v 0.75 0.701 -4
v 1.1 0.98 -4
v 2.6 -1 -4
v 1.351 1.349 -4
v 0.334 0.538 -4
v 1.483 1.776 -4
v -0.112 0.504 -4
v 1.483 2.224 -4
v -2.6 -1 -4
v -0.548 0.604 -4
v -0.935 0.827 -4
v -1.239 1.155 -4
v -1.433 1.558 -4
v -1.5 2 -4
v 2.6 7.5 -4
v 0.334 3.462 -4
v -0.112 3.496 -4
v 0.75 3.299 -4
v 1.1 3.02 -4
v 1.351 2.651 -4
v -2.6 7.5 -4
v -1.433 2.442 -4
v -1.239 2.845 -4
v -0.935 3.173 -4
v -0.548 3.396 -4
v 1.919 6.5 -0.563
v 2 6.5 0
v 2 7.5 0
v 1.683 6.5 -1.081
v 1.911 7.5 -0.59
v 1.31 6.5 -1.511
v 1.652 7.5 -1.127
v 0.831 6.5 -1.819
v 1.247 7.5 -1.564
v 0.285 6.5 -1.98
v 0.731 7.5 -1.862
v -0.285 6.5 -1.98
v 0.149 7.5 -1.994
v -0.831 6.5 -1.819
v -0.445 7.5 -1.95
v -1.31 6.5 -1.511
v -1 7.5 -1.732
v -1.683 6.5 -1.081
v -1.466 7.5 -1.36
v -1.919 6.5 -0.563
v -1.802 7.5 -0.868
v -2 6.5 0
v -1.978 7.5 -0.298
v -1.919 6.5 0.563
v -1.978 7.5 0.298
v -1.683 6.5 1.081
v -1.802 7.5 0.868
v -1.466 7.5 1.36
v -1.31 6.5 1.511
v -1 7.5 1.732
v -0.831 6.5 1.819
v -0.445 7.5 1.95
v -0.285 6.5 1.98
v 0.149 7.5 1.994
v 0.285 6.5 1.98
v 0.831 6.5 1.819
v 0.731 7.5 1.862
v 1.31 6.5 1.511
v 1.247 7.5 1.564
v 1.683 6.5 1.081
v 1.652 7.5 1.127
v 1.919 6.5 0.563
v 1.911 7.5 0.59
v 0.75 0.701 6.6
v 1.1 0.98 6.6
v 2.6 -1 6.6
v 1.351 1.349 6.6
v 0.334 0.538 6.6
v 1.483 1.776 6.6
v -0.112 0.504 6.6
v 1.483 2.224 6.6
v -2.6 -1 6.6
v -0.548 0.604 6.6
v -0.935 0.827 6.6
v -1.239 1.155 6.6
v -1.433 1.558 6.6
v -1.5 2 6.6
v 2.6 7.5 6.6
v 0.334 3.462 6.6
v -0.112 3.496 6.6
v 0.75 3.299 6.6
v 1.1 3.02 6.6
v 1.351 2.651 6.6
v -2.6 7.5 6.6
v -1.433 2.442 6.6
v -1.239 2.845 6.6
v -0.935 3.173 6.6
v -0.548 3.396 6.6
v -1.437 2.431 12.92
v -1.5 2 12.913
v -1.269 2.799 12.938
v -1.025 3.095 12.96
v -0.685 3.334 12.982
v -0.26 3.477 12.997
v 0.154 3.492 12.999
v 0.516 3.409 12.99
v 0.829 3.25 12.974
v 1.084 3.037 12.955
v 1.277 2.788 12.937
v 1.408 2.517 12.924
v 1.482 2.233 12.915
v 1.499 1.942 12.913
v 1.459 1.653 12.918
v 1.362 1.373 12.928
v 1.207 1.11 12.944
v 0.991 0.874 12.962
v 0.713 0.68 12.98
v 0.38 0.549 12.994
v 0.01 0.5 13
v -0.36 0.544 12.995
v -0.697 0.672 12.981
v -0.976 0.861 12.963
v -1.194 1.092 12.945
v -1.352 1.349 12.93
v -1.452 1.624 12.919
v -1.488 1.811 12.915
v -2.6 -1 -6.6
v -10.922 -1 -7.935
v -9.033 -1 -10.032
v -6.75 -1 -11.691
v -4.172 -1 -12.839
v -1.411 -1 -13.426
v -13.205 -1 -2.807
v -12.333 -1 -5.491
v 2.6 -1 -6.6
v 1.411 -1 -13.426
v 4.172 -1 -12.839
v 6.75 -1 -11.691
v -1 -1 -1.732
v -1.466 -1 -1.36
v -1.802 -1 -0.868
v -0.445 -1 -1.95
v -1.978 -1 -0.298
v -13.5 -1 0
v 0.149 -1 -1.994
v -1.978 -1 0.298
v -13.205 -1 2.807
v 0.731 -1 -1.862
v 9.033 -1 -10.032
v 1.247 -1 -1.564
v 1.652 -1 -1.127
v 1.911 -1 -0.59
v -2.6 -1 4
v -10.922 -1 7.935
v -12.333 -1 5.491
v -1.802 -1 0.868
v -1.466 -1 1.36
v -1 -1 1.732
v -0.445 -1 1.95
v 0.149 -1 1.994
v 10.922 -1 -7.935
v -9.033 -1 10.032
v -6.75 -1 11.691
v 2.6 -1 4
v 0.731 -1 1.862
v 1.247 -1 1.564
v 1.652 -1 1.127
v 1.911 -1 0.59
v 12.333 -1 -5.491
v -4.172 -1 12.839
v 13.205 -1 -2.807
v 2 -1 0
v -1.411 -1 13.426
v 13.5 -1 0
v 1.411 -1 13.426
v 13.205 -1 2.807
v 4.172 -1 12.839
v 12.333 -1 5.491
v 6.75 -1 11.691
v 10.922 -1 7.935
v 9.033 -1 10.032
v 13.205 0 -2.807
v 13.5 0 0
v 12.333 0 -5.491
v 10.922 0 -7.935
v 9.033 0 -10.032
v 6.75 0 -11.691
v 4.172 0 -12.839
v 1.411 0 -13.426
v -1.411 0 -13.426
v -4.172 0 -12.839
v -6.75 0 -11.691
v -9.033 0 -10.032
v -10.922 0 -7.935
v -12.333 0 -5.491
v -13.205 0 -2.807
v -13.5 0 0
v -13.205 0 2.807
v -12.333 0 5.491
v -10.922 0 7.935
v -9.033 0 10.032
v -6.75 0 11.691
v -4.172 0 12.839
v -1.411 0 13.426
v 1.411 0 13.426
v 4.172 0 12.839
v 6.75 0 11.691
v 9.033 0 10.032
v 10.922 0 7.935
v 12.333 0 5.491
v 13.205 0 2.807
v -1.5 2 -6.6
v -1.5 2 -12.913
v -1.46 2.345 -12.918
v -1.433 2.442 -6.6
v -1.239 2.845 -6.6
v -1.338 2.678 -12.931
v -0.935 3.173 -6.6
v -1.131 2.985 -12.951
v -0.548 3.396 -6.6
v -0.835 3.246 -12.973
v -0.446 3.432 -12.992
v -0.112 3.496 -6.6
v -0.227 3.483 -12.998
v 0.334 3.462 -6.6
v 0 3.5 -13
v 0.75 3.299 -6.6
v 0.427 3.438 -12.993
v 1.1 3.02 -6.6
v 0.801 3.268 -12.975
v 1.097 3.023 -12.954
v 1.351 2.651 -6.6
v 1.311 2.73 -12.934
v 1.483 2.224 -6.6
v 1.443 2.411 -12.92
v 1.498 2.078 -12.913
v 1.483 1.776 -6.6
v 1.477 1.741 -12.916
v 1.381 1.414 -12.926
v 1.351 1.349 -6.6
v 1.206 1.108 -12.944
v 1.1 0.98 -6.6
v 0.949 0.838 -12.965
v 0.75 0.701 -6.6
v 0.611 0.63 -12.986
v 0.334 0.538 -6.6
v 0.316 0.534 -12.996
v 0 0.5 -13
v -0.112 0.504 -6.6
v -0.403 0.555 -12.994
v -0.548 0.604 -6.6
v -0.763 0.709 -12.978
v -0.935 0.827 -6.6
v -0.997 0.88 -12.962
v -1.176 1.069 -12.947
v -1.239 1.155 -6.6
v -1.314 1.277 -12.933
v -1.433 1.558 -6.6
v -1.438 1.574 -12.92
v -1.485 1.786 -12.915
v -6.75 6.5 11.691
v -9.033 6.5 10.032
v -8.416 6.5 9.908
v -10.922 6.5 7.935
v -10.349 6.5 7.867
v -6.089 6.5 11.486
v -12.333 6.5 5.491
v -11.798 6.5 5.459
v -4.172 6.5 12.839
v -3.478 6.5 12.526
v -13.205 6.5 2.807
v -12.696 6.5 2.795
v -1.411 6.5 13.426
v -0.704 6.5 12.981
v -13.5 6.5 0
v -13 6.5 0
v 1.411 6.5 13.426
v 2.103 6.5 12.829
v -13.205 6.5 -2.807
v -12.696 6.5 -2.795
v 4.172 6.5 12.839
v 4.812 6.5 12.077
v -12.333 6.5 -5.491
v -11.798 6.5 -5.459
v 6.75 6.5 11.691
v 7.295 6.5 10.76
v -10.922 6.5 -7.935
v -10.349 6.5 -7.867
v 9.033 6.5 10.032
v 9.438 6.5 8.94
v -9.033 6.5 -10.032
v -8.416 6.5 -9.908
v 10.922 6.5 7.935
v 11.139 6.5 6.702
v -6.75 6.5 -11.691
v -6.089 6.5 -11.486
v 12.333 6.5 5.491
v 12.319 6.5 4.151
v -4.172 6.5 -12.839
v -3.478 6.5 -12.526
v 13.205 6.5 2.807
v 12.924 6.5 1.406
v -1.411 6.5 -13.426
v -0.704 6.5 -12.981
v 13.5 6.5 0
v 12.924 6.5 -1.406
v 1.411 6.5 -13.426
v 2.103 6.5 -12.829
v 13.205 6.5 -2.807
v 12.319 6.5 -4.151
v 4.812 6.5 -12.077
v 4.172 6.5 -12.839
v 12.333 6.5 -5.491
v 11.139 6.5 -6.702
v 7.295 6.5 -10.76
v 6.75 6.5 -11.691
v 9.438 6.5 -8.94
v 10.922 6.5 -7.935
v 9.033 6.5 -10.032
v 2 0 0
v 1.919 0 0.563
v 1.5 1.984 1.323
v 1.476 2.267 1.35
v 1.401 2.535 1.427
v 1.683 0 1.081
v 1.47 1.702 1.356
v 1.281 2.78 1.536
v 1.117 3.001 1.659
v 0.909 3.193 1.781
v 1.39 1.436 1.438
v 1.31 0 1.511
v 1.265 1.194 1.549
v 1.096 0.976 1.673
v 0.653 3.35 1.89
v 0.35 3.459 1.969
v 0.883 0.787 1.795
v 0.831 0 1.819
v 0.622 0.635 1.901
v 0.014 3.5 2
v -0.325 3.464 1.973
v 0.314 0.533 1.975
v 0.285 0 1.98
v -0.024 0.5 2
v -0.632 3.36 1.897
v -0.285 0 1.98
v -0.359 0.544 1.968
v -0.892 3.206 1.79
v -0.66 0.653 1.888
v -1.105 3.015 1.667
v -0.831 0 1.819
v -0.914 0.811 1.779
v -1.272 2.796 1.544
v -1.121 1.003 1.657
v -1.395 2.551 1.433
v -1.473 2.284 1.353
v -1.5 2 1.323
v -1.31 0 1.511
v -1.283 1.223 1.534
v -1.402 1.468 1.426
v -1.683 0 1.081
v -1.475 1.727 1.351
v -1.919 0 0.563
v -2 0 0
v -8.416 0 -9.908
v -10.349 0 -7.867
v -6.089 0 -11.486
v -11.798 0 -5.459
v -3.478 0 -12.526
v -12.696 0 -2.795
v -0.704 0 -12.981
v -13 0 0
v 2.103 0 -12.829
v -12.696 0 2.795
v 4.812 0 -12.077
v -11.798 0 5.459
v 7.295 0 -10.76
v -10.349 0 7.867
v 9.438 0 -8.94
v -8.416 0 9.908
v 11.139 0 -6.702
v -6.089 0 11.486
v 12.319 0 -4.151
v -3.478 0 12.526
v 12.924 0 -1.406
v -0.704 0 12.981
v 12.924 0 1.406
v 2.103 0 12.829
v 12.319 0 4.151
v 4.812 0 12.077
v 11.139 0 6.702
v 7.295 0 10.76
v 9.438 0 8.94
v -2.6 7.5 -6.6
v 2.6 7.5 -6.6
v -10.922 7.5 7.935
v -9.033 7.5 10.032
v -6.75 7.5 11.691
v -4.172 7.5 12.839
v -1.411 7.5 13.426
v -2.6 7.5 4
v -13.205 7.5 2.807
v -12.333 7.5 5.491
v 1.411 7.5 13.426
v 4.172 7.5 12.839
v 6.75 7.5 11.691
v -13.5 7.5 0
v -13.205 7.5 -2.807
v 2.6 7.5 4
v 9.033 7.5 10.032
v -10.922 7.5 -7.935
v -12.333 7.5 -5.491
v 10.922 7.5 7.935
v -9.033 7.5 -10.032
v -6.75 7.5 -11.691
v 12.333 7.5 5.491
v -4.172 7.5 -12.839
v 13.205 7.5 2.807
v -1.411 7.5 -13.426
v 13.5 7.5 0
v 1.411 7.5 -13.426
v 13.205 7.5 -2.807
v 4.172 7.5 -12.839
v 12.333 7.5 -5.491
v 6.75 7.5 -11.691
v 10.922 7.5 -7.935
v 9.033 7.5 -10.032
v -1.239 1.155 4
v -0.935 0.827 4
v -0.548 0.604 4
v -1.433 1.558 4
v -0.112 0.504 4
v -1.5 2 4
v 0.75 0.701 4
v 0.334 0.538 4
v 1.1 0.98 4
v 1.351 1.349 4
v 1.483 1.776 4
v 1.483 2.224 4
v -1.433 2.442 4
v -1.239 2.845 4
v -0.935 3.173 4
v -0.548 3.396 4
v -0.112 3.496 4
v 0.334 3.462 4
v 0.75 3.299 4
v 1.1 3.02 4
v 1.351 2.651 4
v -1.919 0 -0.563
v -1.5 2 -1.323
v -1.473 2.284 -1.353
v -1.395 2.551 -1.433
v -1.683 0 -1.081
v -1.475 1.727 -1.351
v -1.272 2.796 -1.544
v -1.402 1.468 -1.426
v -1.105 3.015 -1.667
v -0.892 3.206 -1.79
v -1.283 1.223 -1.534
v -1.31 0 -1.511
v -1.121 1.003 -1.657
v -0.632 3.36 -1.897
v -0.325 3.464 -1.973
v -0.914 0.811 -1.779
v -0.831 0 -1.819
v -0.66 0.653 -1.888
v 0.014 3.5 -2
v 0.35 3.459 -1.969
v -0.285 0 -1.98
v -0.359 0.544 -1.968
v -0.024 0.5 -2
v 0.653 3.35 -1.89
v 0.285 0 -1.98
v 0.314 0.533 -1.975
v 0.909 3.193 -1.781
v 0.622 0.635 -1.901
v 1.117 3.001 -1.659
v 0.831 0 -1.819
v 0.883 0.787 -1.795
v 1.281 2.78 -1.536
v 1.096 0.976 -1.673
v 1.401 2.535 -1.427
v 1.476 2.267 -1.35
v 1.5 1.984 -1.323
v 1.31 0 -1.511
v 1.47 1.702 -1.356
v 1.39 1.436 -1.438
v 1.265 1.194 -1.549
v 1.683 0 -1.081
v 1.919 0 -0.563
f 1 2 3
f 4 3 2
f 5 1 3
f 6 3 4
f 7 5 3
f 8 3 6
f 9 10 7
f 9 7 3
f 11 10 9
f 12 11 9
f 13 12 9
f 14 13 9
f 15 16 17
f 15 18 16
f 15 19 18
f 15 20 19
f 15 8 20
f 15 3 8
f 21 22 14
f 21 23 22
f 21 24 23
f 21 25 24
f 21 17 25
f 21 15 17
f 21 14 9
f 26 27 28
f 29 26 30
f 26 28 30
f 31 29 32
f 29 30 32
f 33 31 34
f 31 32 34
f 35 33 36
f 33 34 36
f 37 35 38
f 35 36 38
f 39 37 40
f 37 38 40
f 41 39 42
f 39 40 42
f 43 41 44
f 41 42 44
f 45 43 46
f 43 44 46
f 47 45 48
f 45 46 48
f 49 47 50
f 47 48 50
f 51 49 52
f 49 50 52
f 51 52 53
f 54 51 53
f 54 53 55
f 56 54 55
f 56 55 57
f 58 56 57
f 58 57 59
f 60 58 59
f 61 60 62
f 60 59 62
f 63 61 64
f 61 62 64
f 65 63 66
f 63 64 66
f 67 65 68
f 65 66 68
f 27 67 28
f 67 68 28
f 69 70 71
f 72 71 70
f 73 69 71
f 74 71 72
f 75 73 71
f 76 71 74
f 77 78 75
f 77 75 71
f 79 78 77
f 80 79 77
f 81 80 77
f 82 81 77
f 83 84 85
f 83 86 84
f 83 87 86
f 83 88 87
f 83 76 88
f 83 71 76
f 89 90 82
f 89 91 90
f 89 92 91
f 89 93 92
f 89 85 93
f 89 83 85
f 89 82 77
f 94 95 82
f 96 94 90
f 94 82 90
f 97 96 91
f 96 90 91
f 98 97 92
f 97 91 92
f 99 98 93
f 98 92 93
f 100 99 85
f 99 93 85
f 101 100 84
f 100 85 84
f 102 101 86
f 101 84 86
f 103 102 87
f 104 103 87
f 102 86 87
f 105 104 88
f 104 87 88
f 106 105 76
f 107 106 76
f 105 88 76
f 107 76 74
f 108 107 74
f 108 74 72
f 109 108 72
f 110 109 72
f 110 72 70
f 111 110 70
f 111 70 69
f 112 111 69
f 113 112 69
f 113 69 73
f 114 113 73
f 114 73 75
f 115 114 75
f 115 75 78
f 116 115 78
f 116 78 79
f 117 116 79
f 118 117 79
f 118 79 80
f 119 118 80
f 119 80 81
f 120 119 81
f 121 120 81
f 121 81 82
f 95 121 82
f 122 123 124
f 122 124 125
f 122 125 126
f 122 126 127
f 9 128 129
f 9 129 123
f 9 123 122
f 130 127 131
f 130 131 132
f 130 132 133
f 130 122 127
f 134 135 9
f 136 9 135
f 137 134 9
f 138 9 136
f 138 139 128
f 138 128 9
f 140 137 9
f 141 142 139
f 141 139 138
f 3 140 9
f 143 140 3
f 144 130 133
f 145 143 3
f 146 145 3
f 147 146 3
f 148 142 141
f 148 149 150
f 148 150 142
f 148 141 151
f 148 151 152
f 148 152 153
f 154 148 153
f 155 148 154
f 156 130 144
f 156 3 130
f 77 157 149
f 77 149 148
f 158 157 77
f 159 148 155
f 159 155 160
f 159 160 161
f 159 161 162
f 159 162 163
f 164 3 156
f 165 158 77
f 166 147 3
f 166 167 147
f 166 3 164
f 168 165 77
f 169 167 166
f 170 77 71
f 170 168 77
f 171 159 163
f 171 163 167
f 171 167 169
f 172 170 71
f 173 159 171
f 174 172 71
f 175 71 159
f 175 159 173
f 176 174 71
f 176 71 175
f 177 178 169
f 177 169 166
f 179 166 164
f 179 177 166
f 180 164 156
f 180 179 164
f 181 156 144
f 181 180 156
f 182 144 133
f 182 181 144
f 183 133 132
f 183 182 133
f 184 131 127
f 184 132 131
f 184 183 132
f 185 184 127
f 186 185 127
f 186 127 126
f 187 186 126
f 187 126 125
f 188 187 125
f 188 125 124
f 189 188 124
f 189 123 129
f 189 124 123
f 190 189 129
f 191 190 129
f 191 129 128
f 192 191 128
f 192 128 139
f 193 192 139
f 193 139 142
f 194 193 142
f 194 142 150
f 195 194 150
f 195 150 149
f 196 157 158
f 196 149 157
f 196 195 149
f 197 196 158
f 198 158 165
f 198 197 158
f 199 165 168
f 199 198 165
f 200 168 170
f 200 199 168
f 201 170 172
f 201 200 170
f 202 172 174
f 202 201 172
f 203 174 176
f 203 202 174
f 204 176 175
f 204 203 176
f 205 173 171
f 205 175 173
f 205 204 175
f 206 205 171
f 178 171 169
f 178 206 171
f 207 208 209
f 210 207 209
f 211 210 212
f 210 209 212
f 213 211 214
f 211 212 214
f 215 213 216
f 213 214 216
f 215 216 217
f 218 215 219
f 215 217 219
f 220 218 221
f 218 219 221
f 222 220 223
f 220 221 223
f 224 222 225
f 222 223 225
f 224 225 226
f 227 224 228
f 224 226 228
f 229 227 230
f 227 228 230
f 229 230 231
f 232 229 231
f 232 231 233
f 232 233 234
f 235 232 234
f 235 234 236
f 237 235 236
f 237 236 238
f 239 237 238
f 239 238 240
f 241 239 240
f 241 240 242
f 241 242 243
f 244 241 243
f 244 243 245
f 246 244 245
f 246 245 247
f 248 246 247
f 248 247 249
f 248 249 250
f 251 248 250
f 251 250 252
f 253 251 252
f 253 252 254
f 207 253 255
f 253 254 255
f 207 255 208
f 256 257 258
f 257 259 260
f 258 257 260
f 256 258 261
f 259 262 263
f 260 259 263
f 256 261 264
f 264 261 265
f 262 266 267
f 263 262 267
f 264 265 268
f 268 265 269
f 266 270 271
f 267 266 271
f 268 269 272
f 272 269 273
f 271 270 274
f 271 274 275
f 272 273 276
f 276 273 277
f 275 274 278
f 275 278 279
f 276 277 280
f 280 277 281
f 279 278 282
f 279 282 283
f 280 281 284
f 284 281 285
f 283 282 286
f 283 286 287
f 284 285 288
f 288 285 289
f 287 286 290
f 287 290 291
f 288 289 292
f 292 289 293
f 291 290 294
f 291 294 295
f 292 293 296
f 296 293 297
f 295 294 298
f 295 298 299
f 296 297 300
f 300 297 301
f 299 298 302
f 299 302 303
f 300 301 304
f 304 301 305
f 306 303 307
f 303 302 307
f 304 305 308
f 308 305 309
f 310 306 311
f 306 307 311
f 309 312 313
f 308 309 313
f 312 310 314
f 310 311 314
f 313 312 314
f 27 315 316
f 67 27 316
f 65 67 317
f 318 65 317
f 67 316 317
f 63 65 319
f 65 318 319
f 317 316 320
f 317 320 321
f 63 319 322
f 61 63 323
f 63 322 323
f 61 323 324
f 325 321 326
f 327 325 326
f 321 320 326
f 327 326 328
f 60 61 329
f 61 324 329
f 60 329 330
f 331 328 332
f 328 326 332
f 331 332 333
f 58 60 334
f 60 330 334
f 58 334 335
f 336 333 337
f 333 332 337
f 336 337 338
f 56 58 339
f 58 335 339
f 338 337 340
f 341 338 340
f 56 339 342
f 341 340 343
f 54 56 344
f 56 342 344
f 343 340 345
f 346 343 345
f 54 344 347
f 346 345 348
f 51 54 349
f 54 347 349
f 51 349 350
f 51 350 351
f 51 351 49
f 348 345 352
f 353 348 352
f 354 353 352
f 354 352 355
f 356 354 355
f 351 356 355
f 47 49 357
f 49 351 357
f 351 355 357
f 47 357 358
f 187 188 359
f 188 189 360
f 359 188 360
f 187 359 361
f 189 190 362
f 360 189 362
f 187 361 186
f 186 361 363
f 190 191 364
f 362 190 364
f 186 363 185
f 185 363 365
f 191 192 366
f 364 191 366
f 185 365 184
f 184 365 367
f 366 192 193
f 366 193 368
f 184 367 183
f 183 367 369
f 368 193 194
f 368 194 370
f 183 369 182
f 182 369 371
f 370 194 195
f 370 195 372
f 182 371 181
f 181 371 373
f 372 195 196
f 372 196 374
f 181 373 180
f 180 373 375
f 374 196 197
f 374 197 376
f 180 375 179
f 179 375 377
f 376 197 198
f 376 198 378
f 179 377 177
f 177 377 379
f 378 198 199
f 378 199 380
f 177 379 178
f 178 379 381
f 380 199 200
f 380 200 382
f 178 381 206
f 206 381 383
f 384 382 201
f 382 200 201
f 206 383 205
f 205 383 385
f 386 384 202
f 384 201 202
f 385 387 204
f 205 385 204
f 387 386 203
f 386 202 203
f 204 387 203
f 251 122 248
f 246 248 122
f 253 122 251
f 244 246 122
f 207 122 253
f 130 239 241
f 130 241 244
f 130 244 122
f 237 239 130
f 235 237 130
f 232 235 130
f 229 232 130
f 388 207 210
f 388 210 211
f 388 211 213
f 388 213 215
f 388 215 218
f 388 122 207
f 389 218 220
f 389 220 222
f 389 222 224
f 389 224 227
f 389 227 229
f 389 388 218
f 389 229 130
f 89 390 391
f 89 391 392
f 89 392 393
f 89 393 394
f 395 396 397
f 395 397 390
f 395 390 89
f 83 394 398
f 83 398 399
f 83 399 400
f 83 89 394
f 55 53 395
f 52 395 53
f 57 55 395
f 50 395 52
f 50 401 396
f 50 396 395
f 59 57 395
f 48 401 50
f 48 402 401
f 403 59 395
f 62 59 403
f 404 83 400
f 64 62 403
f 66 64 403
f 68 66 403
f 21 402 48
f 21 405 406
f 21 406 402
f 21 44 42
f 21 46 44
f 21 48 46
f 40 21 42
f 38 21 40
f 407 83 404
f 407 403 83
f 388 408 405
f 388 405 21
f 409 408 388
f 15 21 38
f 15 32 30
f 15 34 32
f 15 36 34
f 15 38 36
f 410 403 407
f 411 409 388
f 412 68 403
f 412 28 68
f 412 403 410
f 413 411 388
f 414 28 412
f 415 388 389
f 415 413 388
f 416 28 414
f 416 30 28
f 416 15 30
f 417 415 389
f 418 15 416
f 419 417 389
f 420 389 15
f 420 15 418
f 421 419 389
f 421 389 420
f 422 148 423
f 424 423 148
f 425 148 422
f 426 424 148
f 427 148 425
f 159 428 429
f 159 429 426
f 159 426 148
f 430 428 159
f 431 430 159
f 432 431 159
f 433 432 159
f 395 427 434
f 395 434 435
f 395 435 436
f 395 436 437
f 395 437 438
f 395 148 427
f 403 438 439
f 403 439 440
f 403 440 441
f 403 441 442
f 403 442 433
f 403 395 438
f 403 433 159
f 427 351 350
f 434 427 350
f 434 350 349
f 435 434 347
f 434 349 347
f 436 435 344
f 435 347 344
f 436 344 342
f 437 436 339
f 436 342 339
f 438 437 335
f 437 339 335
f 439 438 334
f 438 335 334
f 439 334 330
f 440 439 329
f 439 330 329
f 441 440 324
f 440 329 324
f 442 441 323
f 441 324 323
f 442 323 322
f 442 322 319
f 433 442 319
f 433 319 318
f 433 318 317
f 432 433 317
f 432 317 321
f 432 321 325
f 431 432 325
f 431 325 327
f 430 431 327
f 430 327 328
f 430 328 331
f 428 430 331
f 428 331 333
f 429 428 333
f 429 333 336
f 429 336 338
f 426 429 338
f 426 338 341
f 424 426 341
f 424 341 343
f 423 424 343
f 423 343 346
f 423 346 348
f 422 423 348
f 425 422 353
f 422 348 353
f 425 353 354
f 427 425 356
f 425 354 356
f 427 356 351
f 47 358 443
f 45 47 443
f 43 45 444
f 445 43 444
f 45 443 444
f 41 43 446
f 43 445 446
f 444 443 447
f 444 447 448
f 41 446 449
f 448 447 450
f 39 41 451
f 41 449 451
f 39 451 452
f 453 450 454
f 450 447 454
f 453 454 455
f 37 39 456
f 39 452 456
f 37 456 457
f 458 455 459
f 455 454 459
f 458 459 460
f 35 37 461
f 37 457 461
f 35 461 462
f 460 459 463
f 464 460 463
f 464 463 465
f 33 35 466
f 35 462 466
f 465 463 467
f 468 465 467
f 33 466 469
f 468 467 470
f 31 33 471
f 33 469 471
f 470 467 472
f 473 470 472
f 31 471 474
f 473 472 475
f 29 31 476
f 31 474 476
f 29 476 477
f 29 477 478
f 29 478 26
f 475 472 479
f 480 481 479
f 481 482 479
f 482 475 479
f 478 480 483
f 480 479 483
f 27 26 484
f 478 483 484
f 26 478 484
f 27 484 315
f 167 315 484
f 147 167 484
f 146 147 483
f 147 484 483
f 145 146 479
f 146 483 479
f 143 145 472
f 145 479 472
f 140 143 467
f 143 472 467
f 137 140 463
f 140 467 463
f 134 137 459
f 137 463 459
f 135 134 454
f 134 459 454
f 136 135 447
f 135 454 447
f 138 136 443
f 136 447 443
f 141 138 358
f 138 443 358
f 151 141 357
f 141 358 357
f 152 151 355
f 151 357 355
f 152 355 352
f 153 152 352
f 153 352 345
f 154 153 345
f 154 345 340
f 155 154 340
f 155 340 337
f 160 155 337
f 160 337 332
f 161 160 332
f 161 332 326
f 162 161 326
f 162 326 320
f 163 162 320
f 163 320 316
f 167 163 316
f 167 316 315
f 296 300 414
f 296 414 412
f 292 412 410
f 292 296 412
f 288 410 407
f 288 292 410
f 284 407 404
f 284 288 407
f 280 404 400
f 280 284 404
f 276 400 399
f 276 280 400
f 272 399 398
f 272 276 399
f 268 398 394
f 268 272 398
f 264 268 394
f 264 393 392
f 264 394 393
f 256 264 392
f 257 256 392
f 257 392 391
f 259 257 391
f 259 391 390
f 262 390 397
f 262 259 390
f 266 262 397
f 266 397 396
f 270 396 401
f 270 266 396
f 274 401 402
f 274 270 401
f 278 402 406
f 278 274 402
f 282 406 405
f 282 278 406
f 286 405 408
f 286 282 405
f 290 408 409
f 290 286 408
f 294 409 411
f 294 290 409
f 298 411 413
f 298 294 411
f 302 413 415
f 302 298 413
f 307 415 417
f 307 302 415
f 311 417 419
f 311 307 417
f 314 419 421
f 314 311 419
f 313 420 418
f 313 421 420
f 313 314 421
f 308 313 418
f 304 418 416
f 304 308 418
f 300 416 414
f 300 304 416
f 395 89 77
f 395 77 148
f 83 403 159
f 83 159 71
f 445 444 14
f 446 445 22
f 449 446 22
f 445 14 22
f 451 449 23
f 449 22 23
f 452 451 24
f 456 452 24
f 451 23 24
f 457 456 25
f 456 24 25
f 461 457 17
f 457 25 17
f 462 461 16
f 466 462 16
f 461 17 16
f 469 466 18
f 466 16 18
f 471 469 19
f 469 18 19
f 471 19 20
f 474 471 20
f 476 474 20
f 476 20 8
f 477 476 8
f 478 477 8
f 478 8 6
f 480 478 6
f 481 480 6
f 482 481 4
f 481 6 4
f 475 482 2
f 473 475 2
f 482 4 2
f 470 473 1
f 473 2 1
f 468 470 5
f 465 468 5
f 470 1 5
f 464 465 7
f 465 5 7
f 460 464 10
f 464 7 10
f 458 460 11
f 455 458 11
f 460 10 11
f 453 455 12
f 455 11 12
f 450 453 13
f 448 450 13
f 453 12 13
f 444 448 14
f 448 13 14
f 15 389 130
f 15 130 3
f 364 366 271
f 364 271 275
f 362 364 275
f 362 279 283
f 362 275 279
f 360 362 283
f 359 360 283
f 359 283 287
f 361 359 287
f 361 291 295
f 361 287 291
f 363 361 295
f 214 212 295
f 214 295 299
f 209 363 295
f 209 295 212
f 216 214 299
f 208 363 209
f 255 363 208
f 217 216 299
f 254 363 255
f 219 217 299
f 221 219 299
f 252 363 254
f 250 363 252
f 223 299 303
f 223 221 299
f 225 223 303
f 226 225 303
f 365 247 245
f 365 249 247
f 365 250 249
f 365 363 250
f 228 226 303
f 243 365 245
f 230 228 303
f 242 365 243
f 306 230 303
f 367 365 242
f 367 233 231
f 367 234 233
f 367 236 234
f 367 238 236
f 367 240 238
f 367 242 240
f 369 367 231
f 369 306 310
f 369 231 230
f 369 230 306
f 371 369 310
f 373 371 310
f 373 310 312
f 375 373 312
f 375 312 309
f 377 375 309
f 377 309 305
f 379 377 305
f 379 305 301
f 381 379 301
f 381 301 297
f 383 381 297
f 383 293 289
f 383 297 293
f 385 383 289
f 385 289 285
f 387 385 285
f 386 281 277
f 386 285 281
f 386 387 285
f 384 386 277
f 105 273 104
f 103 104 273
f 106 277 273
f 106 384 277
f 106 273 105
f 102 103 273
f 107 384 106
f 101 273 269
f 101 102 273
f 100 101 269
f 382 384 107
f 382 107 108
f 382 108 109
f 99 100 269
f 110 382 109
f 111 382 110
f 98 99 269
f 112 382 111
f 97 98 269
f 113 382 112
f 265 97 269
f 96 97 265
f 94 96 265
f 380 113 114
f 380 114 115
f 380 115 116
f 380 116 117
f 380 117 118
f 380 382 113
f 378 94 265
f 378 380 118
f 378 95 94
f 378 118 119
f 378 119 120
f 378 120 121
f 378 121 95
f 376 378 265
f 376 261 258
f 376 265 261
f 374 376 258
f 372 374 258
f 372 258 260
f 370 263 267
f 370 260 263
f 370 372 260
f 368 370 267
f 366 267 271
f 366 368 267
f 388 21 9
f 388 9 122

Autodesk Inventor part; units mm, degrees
ref_plane "YZ Plane" through (0, 0, 0) normal (1, 0, 0) x (0, 1, 0)
ref_plane "XZ Plane" through (0, 0, 0) normal (0, 1, 0) x (-1, 0, 0)
ref_plane "XY Plane" through (0, 0, 0) normal (0, 0, 1) x (1, 0, 0)
sketch "Эскиз1" plane through (0, 0, 0) normal (0, 1, 0) x (-1, 0, 0)
  circle A0 centre (0, 0) radius 13
  circle A1 centre (0, 0) radius 2
  dimension "d0" = 26
  dimension "d3" = 4
extrude "Выдавливание1" add sketch "Эскиз1" along normal blind 6.5
sketch "Эскиз2" plane through (0, 6.5, 0) normal (0, 1, 0) x (1, 0, 0)
  circle A0 centre (0, 0) radius 13.5
  dimension "d4" = 27
extrude "Выдавливание2" add sketch "Эскиз2" along normal blind 1
sketch "Эскиз3" plane through (0, 0, 0) normal (0, -1, 0) x (1, 0, 0)
  circle A0 centre (0, 0) radius 13.5
  dimension "d7" = 27
extrude "Выдавливание3" add sketch "Эскиз3" along normal blind 1
sketch "Эскиз4" plane through (0, 7.5, 0) normal (0, 1, 0) x (1, 0, 0)
  circle A0 centre (0, 0) radius 2
  line L0 (2.6, -6.6) -> (-2.6, -6.6)
  line L1 (-2.6, -6.6) -> (-2.6, -4)
  line L2 (-2.6, -4) -> (2.6, -4)
  line L3 (2.6, -4) -> (2.6, -6.6)
  line L4 (2.6, 4) -> (-2.6, 4)
  line L5 (-2.6, 4) -> (-2.6, 6.6)
  line L6 (-2.6, 6.6) -> (2.6, 6.6)
  line L7 (2.6, 6.6) -> (2.6, 4)
  dimension "d12" = 4
  dimension "d13" = 5.2
  dimension "d14" = 2.6
  dimension "d15" = 2.6
  dimension "d16" = 4
  dimension "d17" = 5.2
  dimension "d18" = 2.6
  dimension "d19" = 2.6
  dimension "d20" = 4
extrude "Выдавливание4" cut sketch "Эскиз4" against normal blind 8.75
ref_plane "РабПлоскость1" through (2.6, 7.5, -13) normal (0, 0, -1) x (-1, 0, 0)
sketch "Эскиз6" plane through (2.6, 7.5, -13) normal (0, 0, -1) x (-1, 0, 0)
  circle A0 centre (2.6, -5.5) radius 1.5
  line L0 (-10.9, -7.5) -> (16.1, -7.5) projected
  point P0 (2.6, -7.5)
  dimension "d24" = 3
  dimension "d25" = 2
extrude "Выдавливание5" cut sketch "Эскиз6" against normal blind 27
ref_plane "РабПлоскость2" through (13.4, 7.5, -4) normal (1, 0, 0) x (0, 0, -1)
properties part number "koleso"
